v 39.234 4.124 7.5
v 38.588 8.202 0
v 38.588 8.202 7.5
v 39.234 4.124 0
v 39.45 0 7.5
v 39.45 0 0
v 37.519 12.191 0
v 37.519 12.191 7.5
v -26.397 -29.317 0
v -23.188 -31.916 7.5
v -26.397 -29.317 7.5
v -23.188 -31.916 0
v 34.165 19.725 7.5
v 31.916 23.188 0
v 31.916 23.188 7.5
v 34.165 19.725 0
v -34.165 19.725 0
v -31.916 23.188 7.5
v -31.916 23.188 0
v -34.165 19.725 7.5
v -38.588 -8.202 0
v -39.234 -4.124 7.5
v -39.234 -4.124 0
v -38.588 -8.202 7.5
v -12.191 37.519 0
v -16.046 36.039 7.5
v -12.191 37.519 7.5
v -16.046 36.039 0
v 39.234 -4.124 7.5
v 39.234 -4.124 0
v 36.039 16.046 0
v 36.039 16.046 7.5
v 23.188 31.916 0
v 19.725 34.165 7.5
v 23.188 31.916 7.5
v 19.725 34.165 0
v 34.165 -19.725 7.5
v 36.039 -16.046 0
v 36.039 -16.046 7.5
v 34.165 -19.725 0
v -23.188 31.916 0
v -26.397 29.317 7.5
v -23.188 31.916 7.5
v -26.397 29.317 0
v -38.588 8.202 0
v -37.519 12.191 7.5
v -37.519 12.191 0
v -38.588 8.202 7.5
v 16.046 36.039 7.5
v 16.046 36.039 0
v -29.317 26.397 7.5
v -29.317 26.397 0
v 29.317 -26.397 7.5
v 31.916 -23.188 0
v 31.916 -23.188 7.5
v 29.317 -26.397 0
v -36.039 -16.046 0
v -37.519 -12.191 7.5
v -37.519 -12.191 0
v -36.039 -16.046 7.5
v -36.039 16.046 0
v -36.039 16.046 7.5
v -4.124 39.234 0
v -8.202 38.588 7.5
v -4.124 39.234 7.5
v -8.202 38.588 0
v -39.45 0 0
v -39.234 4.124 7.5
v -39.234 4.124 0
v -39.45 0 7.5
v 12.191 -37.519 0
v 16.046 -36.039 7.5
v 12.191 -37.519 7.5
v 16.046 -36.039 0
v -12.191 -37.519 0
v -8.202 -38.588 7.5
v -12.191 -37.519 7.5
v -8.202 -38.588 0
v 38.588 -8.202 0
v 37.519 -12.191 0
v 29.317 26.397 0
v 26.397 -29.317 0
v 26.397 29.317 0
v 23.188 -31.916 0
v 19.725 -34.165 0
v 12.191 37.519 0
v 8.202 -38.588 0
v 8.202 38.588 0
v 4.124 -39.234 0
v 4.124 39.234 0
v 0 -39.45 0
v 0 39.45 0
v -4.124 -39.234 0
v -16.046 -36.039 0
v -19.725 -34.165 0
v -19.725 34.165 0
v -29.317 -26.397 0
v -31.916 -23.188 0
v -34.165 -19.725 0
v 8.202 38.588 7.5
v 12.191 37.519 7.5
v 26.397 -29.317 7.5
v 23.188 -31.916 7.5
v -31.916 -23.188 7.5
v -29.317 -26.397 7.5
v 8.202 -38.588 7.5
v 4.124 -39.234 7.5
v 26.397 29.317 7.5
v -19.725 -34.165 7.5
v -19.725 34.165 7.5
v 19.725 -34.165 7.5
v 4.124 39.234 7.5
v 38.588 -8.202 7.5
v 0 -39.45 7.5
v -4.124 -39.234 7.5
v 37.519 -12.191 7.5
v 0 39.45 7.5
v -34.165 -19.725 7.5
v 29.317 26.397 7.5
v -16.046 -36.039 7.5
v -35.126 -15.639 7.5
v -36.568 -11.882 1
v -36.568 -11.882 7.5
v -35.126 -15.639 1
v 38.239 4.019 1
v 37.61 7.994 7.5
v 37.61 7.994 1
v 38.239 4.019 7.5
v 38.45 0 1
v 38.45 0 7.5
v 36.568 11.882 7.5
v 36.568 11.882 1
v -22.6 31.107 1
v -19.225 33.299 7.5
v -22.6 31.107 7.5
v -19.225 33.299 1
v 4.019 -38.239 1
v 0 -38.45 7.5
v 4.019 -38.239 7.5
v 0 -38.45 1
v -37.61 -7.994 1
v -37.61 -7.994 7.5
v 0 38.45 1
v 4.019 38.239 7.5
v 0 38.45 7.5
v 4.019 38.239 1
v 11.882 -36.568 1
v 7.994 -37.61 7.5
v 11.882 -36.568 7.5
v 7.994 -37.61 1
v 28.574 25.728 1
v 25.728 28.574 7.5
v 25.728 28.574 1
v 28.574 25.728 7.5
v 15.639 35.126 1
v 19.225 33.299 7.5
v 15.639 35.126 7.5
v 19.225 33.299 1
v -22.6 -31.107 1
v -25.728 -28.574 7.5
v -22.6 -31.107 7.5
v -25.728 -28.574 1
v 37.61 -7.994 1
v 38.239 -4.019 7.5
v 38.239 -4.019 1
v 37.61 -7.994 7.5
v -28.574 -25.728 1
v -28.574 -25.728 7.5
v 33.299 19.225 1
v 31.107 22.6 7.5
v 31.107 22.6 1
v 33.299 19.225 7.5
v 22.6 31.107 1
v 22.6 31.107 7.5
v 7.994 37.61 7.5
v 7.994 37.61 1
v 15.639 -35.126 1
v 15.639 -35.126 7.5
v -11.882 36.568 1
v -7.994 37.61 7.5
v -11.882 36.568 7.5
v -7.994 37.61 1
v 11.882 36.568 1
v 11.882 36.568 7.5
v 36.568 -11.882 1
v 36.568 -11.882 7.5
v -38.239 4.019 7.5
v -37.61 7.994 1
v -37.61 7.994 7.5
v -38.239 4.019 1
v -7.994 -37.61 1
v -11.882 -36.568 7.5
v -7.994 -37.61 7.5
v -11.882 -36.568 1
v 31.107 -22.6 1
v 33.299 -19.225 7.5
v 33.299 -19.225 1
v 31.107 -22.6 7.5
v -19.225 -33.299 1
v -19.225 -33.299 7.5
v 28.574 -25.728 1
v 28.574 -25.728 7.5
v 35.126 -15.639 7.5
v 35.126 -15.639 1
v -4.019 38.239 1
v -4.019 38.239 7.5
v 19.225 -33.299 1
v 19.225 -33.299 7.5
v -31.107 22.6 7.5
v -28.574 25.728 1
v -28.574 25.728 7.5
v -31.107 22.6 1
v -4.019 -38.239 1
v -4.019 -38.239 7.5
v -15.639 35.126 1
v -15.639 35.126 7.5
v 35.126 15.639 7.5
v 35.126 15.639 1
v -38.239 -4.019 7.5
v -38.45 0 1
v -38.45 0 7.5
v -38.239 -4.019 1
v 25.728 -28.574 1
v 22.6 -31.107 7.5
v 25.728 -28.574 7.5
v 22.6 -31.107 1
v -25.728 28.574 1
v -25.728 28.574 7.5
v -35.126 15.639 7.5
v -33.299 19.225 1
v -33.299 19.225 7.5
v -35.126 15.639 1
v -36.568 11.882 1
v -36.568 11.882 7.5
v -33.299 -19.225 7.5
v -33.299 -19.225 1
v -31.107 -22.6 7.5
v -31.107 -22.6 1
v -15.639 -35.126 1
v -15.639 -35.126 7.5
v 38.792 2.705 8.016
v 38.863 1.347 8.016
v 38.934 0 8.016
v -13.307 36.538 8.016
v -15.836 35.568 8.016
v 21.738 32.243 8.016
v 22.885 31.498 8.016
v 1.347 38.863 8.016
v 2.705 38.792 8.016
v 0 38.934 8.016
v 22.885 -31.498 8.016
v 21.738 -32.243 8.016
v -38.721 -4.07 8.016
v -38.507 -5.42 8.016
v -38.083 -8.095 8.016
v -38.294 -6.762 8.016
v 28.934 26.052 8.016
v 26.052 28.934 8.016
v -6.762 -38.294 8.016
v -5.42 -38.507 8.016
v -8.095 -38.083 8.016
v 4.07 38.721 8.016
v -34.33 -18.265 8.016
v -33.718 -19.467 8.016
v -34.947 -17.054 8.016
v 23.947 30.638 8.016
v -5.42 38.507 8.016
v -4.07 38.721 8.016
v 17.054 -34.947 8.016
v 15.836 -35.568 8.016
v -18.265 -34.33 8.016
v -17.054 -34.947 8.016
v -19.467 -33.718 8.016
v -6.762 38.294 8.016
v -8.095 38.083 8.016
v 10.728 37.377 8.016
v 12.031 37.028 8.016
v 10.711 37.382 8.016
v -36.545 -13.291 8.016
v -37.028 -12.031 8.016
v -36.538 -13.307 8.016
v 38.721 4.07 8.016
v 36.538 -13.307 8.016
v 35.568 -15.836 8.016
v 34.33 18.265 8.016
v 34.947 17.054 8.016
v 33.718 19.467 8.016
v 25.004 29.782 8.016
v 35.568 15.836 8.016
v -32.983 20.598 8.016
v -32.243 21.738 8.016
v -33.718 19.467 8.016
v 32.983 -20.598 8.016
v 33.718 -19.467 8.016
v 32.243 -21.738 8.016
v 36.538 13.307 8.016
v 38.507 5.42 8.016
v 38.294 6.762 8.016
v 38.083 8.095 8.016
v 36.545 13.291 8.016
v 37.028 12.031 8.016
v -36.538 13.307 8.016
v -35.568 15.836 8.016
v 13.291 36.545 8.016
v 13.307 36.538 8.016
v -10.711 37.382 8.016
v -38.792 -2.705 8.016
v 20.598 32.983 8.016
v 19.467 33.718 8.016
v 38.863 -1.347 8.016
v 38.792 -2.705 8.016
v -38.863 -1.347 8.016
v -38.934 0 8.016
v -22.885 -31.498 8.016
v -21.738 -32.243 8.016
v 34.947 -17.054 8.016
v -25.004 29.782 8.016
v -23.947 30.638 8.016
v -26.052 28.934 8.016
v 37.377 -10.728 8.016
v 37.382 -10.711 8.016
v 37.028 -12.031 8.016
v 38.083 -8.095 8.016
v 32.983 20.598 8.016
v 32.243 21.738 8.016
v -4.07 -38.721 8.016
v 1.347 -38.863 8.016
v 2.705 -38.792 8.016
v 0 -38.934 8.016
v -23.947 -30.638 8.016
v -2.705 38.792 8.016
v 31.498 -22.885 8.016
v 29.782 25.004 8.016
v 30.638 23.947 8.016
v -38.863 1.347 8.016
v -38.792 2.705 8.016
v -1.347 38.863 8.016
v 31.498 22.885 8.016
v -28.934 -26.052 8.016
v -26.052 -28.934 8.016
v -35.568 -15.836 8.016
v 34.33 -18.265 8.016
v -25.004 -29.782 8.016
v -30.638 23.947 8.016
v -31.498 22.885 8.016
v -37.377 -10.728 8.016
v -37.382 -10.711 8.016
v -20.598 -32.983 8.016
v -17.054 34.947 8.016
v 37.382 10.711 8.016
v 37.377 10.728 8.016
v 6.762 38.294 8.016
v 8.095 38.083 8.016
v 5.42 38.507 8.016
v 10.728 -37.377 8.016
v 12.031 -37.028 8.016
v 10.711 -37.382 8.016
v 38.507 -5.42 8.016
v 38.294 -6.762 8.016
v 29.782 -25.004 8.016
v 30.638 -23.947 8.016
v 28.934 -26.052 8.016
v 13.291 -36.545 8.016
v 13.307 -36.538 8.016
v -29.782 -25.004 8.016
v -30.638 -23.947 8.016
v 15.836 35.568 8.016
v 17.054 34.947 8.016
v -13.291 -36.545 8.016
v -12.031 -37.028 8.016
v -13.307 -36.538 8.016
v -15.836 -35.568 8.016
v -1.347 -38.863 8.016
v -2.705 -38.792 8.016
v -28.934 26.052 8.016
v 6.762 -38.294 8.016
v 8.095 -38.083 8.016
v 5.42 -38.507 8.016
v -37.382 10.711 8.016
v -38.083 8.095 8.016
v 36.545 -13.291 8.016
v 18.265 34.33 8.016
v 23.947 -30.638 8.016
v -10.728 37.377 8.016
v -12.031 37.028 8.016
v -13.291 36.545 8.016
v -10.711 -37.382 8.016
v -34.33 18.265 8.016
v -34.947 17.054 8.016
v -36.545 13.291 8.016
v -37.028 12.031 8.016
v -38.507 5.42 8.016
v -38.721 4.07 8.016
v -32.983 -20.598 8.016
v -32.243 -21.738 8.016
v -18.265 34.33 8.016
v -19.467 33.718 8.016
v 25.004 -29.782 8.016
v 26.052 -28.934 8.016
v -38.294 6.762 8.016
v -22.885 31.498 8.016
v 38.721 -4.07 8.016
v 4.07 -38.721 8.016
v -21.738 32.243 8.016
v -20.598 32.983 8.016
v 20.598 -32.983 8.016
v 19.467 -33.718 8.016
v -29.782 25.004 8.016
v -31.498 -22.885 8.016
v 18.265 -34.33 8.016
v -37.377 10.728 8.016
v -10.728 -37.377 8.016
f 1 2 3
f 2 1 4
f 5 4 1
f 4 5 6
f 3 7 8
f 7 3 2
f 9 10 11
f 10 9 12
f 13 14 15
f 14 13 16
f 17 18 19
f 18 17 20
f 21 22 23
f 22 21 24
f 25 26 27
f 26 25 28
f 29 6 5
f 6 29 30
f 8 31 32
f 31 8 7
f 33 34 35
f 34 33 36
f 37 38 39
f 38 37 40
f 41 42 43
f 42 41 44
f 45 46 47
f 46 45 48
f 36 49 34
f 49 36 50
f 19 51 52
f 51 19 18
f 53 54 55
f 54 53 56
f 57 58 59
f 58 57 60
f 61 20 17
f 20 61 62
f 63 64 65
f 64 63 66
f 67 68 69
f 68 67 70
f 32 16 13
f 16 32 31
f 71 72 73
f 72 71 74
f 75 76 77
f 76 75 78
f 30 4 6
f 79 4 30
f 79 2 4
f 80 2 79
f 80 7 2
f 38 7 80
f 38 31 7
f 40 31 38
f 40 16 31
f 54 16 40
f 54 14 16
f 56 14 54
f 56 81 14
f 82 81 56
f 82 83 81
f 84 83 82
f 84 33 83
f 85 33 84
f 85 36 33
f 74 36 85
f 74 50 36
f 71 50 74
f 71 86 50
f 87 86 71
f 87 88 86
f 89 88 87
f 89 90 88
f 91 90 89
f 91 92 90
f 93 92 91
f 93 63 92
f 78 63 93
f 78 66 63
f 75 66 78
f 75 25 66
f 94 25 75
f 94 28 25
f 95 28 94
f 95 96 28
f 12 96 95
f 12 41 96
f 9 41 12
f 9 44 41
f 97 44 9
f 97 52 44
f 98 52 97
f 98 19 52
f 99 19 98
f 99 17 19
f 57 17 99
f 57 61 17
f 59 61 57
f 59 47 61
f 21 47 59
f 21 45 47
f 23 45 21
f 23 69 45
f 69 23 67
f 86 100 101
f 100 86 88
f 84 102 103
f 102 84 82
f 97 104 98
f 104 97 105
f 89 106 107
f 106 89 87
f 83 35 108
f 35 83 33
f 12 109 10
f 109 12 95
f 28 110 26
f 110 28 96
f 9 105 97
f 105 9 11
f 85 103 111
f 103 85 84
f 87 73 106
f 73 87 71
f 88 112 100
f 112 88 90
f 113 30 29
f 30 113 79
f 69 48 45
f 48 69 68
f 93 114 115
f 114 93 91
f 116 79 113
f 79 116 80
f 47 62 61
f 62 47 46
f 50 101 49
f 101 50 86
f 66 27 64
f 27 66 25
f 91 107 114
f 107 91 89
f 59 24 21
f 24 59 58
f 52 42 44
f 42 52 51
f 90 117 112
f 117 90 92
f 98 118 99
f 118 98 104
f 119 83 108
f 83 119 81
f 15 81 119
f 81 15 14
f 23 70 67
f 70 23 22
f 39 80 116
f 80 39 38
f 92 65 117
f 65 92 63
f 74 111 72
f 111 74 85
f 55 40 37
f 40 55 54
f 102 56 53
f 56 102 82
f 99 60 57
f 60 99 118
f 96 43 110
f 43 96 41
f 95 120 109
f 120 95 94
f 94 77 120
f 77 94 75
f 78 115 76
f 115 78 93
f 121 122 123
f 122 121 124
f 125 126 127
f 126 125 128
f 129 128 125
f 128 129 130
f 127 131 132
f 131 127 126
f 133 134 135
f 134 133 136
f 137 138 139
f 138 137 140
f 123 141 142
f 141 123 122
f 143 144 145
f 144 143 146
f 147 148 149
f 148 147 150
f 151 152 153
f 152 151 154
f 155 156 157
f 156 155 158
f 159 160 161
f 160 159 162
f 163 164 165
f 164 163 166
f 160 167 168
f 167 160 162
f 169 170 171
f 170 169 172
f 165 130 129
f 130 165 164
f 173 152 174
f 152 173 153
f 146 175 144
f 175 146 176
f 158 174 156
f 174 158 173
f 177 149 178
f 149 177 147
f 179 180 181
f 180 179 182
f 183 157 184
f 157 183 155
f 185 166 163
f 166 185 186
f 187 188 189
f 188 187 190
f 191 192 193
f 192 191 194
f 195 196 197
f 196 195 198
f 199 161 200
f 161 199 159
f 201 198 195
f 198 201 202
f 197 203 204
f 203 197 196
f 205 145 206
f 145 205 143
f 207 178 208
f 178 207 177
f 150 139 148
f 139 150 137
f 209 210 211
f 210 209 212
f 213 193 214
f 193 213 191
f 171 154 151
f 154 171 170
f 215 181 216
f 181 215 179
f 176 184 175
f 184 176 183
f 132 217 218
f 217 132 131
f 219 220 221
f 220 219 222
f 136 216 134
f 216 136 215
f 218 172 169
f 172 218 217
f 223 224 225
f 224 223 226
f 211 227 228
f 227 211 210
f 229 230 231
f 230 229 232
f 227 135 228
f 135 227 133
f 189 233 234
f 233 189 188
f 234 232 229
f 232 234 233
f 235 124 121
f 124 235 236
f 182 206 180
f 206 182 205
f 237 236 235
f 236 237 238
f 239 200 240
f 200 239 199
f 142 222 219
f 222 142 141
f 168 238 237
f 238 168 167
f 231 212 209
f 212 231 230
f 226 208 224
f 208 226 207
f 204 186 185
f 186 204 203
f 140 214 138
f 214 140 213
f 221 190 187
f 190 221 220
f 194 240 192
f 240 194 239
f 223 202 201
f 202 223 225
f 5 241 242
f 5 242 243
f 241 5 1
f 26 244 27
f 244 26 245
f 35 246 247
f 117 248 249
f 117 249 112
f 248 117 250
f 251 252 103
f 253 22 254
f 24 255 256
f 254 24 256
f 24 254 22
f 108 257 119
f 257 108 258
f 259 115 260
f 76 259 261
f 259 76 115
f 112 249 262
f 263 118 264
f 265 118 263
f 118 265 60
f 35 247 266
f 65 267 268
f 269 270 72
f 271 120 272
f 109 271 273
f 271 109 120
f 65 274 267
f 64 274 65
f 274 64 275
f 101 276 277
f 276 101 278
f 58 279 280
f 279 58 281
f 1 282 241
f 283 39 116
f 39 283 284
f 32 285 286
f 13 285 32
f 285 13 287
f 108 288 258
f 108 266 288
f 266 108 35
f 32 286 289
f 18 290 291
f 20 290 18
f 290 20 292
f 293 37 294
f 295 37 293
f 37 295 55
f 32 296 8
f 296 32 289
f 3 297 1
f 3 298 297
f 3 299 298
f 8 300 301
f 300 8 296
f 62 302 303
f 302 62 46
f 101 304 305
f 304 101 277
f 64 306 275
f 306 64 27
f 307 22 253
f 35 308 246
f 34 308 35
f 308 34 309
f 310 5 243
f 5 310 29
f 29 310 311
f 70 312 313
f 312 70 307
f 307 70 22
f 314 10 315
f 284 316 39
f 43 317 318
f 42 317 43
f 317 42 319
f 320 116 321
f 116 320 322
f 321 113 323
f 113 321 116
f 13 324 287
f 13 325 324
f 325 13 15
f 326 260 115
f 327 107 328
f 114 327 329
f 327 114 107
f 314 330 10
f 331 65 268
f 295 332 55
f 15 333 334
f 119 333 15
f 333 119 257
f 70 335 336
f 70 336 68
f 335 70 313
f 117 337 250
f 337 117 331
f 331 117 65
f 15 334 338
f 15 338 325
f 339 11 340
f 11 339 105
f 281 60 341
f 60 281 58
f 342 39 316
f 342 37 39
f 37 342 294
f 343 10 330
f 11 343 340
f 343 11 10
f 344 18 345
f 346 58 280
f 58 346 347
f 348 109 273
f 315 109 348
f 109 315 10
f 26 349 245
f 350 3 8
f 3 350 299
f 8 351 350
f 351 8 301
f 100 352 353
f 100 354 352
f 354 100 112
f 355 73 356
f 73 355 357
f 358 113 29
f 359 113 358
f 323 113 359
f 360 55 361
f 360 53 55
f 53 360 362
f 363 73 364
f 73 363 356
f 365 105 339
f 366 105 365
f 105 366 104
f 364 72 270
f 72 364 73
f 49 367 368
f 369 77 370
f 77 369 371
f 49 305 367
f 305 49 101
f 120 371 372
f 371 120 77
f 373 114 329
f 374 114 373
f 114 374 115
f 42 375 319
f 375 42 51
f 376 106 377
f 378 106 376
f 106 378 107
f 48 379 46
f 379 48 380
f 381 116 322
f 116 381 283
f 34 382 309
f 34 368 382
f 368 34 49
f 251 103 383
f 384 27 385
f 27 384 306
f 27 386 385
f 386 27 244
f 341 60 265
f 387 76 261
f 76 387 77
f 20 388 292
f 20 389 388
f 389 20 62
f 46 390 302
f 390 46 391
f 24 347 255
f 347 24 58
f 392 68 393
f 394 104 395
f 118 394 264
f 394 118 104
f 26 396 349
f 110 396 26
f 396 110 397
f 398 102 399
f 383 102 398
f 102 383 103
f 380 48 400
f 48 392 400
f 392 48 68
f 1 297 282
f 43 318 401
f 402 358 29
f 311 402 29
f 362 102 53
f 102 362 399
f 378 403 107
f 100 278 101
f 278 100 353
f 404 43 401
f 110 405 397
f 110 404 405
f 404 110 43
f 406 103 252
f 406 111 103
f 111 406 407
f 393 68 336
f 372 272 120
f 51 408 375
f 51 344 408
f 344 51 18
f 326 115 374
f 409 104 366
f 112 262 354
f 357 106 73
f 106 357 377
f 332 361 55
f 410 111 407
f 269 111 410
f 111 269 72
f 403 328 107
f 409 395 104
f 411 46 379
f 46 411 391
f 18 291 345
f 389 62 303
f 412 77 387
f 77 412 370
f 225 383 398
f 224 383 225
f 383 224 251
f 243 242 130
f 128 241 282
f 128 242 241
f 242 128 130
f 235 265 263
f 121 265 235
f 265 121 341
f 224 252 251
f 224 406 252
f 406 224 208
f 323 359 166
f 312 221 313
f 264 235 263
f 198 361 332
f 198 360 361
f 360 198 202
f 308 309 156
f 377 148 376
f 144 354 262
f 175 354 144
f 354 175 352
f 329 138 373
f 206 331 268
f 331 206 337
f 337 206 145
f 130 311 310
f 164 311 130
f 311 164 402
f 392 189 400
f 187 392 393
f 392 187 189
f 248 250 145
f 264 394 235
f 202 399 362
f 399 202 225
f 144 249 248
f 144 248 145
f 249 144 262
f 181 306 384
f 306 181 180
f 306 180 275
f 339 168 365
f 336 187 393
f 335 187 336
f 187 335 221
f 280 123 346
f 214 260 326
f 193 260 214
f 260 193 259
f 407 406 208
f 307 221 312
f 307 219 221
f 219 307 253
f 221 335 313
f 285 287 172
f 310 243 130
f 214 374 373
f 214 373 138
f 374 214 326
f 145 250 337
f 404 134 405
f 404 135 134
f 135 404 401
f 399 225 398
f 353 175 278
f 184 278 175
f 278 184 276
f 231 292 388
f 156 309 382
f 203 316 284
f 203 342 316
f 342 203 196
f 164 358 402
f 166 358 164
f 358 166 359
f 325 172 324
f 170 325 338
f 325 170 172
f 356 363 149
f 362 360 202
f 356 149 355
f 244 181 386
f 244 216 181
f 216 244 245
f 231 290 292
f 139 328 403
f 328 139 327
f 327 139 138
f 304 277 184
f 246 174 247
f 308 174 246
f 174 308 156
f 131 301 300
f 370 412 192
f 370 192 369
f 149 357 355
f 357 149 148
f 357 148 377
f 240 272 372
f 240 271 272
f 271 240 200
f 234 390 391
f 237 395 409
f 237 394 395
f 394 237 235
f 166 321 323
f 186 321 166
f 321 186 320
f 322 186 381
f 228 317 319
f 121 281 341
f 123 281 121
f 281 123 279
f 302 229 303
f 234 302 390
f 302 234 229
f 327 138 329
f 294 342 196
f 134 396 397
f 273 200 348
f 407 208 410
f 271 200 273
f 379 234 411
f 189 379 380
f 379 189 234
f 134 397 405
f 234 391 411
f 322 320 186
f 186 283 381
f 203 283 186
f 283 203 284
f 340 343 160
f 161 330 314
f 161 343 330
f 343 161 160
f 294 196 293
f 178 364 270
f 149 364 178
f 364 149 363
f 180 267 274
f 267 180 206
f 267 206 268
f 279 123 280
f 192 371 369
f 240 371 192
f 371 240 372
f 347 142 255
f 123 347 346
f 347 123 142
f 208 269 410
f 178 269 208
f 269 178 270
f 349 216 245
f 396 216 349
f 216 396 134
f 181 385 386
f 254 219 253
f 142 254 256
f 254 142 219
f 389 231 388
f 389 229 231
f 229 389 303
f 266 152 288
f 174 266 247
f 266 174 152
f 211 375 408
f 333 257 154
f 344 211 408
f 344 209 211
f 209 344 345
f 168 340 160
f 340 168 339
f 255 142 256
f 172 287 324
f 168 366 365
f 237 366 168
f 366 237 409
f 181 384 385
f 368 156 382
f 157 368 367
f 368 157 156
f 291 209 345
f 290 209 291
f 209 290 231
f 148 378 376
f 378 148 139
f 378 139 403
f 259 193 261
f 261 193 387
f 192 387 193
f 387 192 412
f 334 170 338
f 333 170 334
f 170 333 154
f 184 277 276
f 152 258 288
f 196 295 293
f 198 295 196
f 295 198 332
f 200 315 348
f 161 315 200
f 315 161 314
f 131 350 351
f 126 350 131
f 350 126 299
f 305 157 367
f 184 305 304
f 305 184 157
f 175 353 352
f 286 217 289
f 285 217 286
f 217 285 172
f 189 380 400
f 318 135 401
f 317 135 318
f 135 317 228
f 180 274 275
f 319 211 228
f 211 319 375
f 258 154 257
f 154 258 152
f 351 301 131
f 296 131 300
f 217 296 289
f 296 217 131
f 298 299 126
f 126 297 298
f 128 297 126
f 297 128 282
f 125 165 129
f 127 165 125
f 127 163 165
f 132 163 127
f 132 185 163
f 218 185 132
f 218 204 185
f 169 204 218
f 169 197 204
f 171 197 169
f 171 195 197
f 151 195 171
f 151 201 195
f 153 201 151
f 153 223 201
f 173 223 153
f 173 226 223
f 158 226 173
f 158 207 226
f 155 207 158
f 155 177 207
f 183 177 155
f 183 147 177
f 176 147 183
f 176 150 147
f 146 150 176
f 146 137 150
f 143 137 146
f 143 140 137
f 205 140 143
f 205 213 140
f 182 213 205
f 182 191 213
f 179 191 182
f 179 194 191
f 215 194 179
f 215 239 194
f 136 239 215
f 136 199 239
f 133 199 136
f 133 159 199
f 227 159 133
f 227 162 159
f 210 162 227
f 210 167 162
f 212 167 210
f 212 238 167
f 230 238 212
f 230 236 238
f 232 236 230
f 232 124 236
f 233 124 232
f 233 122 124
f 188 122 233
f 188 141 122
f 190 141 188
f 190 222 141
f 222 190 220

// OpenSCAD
// =============================================
// 3D: Circular Plate Cap Ø123.6 (shell 1 mm, height 5 mm)
// Version: 1.0
// Author: ChatGPT (OpenSCAD)
// =============================================

// ----------------------------
// Настройка точности
// ----------------------------
description = "Circular Plate Cap Ø76.1 (shell 1 mm, height 10 mm)";
$fn = 0;        // фиксированную сегментацию отключаем
$fa = 6;        // 5–8° обычно достаточно
$fs = 0.35;     // ≈ диаметр сопла (0.3–0.5 для сопла 0.4)
pin_fs = 0.25;  // чуть тоньше для штырей и отверстий

// ----------------------------
// Тестовые фрагменты (стандартный блок)
// ----------------------------
test_fragment = false; // true — печатать только укороченные фрагменты (base)
frag_size     = 20;    // размер квадрата вырезки, мм
frag_index    = 0;     // 0=НЛ, 1=ВЛ, 2=НП, 3=ВП (относительно основания)
frag_gap_x    = 10;    // зазор между фрагментами по X, мм
frag_h_extra  = 20;    // запас по высоте клипа, мм

// ----------------------------
// Фаски/скругления по краям
// ----------------------------
tiny = 0.1;                  // небольшой зазор для булевых операций
edge_chamfer_z = 0.8;        // высота фаски по Z (мм) для верхнего края
edge_chamfer_x = 0;          // совместимость с шаблонами
edge_chamfer_y = 0;          // совместимость с шаблонами
screen_frame_gap = 0.2;      // совместимость

// Скругления
radius_r = 1.5;              // целевой радиус округлений (1–2 мм по ТЗ)

// ----------------------------
// Параметры модели (все размеры в мм)
// ----------------------------
cap_inner_d     = 76.1;   // внутренний диаметр колпака (посадка)
wall_th         = 1.0;     // толщина стенки (радиальная)
top_th          = 1.0;     // толщина крышки сверху
cap_height      = 10.0;     // общая наружная высота колпака
fit_extra_inner = 0.4;    // технологический запас внутрь (увеличение внутреннего Ø)

// Вычисляемые размеры
cap_inner_d_eff = cap_inner_d + 2*fit_extra_inner; // реальный внутренний Ø для печати
cap_outer_d     = cap_inner_d_eff + 2*wall_th;     // наружный Ø
skirt_h         = max(cap_height - top_th, tiny);  // высота юбки (без верхней крышки)

// ----------------------------
// Комментарии по устройству модели
// ----------------------------
// Фрагменты:
// - base: полный колпак — круглая крышка толщиной top_th + цилиндрическая юбка высотой skirt_h
// - Внутренний паз формируется разницей цилиндров (контроль посадки через fit_extra_inner)
// - Наружный диск БЕЗ скругления кромок (по просьбе)

// ----------------------------
// Вспомогательные функции/модули
// ----------------------------
module round_chamfer_ring(d_outer, d_inner, h, chamfer){
    h_ch = min(chamfer, h/2);
    difference(){
        cylinder(h=h - h_ch, d=d_outer);
        translate([0,0,0]) cylinder(h=h - h_ch + tiny, d=d_inner);
    }
    difference(){
        translate([0,0,h - h_ch]) cylinder(h=h_ch, d1=d_outer, d2=max(d_outer - 2*h_ch, tiny));
        translate([0,0,h - h_ch]) cylinder(h=h_ch + tiny, d1=d_inner, d2=max(d_inner + 2*h_ch, tiny));
    }
}

module cap_body(){
    union(){
        // Плоский диск без скругления
        cylinder(h=top_th, d=cap_outer_d);
        // Юбка с мягким переходом сверху
        translate([0,0,0])
            round_chamfer_ring(d_outer=cap_outer_d, d_inner=cap_inner_d_eff, h=skirt_h, chamfer=radius_r);
    }
}

// ----------------------------
// Основная деталь
// ----------------------------
module base(){
    cap_body();
}

// ---------------
// Клиппер фрагментов
// ---------------
module clip_for_fragments(){
    if(test_fragment){
        translate([0,0,0])
            intersection(){
                children();
                translate([-frag_size/2, -frag_size/2, -frag_h_extra])
                    cube([frag_size, frag_size, cap_height + 2*frag_h_extra], center=false);
            }
        translate([cap_outer_d/2 + frag_gap_x + frag_size/2, 0, 0])
            intersection(){
                children();
                translate([-frag_size/2, -frag_size/2, cap_height/2])
                    cube([frag_size, frag_size, cap_height], center=false);
            }
    }else{
        children();
    }
}

// ----------------------------
// ВЫВОД МОДЕЛИ
// ----------------------------
clip_for_fragments() base();
